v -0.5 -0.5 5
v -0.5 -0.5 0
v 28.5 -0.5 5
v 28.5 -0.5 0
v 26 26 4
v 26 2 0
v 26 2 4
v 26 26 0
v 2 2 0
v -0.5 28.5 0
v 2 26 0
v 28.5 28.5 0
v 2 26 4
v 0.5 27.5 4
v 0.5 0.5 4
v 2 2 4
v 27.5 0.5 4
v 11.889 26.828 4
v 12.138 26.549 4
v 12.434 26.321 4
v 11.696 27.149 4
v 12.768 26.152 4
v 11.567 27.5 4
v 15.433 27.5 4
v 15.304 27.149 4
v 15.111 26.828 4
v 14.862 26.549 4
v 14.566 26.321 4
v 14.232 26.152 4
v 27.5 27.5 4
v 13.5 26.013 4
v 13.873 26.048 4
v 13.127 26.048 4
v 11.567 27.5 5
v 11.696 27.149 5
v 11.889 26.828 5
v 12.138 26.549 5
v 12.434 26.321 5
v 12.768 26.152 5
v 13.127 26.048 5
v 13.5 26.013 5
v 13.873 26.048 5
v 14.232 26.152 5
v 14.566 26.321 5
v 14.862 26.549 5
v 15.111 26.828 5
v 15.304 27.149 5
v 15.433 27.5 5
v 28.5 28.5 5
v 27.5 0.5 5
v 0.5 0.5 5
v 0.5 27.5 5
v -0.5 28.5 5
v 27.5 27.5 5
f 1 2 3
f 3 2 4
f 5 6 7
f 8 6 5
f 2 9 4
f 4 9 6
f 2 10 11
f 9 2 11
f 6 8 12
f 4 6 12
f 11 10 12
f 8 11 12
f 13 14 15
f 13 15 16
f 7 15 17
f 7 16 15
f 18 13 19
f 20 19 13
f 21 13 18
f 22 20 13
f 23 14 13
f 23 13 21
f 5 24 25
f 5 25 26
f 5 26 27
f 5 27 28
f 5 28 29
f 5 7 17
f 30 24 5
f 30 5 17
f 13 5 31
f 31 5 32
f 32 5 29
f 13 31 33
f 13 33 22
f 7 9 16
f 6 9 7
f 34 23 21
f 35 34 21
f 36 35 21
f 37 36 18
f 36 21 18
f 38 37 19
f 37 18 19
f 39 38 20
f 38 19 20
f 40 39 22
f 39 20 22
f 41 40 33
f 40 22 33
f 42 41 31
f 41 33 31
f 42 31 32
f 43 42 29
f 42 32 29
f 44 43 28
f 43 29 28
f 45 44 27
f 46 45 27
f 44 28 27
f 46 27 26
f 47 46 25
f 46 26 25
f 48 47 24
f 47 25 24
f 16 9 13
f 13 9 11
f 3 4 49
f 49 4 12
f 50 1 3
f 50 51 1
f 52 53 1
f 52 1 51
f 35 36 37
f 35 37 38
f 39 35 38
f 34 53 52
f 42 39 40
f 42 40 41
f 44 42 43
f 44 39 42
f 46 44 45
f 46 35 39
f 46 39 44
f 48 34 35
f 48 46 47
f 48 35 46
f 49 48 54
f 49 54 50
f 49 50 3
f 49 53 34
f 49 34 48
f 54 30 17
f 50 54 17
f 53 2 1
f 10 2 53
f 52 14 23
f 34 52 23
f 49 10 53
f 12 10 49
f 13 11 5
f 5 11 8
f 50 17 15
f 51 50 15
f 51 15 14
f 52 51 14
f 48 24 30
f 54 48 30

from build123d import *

# Parameters (mm, degrees)
F0_W     = 29
F0_H     = 29
F1_DEPTH = 5
F0_W_2   = 24
F0_H_2   = 24
F2_DEPTH = 4


with BuildPart() as f1:
    # F0 (on Top) → F1 (new body)
    with BuildSketch(Plane.XY):
        with Locations((14, 14)):
            Rectangle(F0_W, F0_H)
        with BuildLine():
            Line((0.5, 27.5), (11.566837, 27.5))
            ThreePointArc((11.566837, 27.5), (13.5, 26.01284), (15.433163, 27.5))
            Line((15.433163, 27.5), (27.5, 27.5))
            Line((27.5, 27.5), (27.5, 0.5))
            Line((27.5, 0.5), (0.5, 0.5))
            Line((0.5, 0.5), (0.5, 27.5))
        make_face(mode=Mode.SUBTRACT)
    extrude(amount=F1_DEPTH)

    # F0 (on Top) → F2 (join)
    with BuildSketch(Plane.XY):
        with BuildLine():
            ThreePointArc((15.433163, 27.5), (13.5, 26.01284), (11.566837, 27.5))
            Line((11.566837, 27.5), (0.5, 27.5))
            Line((0.5, 27.5), (0.5, 0.5))
            Line((0.5, 0.5), (27.5, 0.5))
            Line((27.5, 0.5), (27.5, 27.5))
            Line((27.5, 27.5), (15.433163, 27.5))
        make_face()
        with Locations((14, 14)):
            Rectangle(F0_W_2, F0_H_2, mode=Mode.SUBTRACT)
    extrude(amount=F2_DEPTH)


solid = f1.part
